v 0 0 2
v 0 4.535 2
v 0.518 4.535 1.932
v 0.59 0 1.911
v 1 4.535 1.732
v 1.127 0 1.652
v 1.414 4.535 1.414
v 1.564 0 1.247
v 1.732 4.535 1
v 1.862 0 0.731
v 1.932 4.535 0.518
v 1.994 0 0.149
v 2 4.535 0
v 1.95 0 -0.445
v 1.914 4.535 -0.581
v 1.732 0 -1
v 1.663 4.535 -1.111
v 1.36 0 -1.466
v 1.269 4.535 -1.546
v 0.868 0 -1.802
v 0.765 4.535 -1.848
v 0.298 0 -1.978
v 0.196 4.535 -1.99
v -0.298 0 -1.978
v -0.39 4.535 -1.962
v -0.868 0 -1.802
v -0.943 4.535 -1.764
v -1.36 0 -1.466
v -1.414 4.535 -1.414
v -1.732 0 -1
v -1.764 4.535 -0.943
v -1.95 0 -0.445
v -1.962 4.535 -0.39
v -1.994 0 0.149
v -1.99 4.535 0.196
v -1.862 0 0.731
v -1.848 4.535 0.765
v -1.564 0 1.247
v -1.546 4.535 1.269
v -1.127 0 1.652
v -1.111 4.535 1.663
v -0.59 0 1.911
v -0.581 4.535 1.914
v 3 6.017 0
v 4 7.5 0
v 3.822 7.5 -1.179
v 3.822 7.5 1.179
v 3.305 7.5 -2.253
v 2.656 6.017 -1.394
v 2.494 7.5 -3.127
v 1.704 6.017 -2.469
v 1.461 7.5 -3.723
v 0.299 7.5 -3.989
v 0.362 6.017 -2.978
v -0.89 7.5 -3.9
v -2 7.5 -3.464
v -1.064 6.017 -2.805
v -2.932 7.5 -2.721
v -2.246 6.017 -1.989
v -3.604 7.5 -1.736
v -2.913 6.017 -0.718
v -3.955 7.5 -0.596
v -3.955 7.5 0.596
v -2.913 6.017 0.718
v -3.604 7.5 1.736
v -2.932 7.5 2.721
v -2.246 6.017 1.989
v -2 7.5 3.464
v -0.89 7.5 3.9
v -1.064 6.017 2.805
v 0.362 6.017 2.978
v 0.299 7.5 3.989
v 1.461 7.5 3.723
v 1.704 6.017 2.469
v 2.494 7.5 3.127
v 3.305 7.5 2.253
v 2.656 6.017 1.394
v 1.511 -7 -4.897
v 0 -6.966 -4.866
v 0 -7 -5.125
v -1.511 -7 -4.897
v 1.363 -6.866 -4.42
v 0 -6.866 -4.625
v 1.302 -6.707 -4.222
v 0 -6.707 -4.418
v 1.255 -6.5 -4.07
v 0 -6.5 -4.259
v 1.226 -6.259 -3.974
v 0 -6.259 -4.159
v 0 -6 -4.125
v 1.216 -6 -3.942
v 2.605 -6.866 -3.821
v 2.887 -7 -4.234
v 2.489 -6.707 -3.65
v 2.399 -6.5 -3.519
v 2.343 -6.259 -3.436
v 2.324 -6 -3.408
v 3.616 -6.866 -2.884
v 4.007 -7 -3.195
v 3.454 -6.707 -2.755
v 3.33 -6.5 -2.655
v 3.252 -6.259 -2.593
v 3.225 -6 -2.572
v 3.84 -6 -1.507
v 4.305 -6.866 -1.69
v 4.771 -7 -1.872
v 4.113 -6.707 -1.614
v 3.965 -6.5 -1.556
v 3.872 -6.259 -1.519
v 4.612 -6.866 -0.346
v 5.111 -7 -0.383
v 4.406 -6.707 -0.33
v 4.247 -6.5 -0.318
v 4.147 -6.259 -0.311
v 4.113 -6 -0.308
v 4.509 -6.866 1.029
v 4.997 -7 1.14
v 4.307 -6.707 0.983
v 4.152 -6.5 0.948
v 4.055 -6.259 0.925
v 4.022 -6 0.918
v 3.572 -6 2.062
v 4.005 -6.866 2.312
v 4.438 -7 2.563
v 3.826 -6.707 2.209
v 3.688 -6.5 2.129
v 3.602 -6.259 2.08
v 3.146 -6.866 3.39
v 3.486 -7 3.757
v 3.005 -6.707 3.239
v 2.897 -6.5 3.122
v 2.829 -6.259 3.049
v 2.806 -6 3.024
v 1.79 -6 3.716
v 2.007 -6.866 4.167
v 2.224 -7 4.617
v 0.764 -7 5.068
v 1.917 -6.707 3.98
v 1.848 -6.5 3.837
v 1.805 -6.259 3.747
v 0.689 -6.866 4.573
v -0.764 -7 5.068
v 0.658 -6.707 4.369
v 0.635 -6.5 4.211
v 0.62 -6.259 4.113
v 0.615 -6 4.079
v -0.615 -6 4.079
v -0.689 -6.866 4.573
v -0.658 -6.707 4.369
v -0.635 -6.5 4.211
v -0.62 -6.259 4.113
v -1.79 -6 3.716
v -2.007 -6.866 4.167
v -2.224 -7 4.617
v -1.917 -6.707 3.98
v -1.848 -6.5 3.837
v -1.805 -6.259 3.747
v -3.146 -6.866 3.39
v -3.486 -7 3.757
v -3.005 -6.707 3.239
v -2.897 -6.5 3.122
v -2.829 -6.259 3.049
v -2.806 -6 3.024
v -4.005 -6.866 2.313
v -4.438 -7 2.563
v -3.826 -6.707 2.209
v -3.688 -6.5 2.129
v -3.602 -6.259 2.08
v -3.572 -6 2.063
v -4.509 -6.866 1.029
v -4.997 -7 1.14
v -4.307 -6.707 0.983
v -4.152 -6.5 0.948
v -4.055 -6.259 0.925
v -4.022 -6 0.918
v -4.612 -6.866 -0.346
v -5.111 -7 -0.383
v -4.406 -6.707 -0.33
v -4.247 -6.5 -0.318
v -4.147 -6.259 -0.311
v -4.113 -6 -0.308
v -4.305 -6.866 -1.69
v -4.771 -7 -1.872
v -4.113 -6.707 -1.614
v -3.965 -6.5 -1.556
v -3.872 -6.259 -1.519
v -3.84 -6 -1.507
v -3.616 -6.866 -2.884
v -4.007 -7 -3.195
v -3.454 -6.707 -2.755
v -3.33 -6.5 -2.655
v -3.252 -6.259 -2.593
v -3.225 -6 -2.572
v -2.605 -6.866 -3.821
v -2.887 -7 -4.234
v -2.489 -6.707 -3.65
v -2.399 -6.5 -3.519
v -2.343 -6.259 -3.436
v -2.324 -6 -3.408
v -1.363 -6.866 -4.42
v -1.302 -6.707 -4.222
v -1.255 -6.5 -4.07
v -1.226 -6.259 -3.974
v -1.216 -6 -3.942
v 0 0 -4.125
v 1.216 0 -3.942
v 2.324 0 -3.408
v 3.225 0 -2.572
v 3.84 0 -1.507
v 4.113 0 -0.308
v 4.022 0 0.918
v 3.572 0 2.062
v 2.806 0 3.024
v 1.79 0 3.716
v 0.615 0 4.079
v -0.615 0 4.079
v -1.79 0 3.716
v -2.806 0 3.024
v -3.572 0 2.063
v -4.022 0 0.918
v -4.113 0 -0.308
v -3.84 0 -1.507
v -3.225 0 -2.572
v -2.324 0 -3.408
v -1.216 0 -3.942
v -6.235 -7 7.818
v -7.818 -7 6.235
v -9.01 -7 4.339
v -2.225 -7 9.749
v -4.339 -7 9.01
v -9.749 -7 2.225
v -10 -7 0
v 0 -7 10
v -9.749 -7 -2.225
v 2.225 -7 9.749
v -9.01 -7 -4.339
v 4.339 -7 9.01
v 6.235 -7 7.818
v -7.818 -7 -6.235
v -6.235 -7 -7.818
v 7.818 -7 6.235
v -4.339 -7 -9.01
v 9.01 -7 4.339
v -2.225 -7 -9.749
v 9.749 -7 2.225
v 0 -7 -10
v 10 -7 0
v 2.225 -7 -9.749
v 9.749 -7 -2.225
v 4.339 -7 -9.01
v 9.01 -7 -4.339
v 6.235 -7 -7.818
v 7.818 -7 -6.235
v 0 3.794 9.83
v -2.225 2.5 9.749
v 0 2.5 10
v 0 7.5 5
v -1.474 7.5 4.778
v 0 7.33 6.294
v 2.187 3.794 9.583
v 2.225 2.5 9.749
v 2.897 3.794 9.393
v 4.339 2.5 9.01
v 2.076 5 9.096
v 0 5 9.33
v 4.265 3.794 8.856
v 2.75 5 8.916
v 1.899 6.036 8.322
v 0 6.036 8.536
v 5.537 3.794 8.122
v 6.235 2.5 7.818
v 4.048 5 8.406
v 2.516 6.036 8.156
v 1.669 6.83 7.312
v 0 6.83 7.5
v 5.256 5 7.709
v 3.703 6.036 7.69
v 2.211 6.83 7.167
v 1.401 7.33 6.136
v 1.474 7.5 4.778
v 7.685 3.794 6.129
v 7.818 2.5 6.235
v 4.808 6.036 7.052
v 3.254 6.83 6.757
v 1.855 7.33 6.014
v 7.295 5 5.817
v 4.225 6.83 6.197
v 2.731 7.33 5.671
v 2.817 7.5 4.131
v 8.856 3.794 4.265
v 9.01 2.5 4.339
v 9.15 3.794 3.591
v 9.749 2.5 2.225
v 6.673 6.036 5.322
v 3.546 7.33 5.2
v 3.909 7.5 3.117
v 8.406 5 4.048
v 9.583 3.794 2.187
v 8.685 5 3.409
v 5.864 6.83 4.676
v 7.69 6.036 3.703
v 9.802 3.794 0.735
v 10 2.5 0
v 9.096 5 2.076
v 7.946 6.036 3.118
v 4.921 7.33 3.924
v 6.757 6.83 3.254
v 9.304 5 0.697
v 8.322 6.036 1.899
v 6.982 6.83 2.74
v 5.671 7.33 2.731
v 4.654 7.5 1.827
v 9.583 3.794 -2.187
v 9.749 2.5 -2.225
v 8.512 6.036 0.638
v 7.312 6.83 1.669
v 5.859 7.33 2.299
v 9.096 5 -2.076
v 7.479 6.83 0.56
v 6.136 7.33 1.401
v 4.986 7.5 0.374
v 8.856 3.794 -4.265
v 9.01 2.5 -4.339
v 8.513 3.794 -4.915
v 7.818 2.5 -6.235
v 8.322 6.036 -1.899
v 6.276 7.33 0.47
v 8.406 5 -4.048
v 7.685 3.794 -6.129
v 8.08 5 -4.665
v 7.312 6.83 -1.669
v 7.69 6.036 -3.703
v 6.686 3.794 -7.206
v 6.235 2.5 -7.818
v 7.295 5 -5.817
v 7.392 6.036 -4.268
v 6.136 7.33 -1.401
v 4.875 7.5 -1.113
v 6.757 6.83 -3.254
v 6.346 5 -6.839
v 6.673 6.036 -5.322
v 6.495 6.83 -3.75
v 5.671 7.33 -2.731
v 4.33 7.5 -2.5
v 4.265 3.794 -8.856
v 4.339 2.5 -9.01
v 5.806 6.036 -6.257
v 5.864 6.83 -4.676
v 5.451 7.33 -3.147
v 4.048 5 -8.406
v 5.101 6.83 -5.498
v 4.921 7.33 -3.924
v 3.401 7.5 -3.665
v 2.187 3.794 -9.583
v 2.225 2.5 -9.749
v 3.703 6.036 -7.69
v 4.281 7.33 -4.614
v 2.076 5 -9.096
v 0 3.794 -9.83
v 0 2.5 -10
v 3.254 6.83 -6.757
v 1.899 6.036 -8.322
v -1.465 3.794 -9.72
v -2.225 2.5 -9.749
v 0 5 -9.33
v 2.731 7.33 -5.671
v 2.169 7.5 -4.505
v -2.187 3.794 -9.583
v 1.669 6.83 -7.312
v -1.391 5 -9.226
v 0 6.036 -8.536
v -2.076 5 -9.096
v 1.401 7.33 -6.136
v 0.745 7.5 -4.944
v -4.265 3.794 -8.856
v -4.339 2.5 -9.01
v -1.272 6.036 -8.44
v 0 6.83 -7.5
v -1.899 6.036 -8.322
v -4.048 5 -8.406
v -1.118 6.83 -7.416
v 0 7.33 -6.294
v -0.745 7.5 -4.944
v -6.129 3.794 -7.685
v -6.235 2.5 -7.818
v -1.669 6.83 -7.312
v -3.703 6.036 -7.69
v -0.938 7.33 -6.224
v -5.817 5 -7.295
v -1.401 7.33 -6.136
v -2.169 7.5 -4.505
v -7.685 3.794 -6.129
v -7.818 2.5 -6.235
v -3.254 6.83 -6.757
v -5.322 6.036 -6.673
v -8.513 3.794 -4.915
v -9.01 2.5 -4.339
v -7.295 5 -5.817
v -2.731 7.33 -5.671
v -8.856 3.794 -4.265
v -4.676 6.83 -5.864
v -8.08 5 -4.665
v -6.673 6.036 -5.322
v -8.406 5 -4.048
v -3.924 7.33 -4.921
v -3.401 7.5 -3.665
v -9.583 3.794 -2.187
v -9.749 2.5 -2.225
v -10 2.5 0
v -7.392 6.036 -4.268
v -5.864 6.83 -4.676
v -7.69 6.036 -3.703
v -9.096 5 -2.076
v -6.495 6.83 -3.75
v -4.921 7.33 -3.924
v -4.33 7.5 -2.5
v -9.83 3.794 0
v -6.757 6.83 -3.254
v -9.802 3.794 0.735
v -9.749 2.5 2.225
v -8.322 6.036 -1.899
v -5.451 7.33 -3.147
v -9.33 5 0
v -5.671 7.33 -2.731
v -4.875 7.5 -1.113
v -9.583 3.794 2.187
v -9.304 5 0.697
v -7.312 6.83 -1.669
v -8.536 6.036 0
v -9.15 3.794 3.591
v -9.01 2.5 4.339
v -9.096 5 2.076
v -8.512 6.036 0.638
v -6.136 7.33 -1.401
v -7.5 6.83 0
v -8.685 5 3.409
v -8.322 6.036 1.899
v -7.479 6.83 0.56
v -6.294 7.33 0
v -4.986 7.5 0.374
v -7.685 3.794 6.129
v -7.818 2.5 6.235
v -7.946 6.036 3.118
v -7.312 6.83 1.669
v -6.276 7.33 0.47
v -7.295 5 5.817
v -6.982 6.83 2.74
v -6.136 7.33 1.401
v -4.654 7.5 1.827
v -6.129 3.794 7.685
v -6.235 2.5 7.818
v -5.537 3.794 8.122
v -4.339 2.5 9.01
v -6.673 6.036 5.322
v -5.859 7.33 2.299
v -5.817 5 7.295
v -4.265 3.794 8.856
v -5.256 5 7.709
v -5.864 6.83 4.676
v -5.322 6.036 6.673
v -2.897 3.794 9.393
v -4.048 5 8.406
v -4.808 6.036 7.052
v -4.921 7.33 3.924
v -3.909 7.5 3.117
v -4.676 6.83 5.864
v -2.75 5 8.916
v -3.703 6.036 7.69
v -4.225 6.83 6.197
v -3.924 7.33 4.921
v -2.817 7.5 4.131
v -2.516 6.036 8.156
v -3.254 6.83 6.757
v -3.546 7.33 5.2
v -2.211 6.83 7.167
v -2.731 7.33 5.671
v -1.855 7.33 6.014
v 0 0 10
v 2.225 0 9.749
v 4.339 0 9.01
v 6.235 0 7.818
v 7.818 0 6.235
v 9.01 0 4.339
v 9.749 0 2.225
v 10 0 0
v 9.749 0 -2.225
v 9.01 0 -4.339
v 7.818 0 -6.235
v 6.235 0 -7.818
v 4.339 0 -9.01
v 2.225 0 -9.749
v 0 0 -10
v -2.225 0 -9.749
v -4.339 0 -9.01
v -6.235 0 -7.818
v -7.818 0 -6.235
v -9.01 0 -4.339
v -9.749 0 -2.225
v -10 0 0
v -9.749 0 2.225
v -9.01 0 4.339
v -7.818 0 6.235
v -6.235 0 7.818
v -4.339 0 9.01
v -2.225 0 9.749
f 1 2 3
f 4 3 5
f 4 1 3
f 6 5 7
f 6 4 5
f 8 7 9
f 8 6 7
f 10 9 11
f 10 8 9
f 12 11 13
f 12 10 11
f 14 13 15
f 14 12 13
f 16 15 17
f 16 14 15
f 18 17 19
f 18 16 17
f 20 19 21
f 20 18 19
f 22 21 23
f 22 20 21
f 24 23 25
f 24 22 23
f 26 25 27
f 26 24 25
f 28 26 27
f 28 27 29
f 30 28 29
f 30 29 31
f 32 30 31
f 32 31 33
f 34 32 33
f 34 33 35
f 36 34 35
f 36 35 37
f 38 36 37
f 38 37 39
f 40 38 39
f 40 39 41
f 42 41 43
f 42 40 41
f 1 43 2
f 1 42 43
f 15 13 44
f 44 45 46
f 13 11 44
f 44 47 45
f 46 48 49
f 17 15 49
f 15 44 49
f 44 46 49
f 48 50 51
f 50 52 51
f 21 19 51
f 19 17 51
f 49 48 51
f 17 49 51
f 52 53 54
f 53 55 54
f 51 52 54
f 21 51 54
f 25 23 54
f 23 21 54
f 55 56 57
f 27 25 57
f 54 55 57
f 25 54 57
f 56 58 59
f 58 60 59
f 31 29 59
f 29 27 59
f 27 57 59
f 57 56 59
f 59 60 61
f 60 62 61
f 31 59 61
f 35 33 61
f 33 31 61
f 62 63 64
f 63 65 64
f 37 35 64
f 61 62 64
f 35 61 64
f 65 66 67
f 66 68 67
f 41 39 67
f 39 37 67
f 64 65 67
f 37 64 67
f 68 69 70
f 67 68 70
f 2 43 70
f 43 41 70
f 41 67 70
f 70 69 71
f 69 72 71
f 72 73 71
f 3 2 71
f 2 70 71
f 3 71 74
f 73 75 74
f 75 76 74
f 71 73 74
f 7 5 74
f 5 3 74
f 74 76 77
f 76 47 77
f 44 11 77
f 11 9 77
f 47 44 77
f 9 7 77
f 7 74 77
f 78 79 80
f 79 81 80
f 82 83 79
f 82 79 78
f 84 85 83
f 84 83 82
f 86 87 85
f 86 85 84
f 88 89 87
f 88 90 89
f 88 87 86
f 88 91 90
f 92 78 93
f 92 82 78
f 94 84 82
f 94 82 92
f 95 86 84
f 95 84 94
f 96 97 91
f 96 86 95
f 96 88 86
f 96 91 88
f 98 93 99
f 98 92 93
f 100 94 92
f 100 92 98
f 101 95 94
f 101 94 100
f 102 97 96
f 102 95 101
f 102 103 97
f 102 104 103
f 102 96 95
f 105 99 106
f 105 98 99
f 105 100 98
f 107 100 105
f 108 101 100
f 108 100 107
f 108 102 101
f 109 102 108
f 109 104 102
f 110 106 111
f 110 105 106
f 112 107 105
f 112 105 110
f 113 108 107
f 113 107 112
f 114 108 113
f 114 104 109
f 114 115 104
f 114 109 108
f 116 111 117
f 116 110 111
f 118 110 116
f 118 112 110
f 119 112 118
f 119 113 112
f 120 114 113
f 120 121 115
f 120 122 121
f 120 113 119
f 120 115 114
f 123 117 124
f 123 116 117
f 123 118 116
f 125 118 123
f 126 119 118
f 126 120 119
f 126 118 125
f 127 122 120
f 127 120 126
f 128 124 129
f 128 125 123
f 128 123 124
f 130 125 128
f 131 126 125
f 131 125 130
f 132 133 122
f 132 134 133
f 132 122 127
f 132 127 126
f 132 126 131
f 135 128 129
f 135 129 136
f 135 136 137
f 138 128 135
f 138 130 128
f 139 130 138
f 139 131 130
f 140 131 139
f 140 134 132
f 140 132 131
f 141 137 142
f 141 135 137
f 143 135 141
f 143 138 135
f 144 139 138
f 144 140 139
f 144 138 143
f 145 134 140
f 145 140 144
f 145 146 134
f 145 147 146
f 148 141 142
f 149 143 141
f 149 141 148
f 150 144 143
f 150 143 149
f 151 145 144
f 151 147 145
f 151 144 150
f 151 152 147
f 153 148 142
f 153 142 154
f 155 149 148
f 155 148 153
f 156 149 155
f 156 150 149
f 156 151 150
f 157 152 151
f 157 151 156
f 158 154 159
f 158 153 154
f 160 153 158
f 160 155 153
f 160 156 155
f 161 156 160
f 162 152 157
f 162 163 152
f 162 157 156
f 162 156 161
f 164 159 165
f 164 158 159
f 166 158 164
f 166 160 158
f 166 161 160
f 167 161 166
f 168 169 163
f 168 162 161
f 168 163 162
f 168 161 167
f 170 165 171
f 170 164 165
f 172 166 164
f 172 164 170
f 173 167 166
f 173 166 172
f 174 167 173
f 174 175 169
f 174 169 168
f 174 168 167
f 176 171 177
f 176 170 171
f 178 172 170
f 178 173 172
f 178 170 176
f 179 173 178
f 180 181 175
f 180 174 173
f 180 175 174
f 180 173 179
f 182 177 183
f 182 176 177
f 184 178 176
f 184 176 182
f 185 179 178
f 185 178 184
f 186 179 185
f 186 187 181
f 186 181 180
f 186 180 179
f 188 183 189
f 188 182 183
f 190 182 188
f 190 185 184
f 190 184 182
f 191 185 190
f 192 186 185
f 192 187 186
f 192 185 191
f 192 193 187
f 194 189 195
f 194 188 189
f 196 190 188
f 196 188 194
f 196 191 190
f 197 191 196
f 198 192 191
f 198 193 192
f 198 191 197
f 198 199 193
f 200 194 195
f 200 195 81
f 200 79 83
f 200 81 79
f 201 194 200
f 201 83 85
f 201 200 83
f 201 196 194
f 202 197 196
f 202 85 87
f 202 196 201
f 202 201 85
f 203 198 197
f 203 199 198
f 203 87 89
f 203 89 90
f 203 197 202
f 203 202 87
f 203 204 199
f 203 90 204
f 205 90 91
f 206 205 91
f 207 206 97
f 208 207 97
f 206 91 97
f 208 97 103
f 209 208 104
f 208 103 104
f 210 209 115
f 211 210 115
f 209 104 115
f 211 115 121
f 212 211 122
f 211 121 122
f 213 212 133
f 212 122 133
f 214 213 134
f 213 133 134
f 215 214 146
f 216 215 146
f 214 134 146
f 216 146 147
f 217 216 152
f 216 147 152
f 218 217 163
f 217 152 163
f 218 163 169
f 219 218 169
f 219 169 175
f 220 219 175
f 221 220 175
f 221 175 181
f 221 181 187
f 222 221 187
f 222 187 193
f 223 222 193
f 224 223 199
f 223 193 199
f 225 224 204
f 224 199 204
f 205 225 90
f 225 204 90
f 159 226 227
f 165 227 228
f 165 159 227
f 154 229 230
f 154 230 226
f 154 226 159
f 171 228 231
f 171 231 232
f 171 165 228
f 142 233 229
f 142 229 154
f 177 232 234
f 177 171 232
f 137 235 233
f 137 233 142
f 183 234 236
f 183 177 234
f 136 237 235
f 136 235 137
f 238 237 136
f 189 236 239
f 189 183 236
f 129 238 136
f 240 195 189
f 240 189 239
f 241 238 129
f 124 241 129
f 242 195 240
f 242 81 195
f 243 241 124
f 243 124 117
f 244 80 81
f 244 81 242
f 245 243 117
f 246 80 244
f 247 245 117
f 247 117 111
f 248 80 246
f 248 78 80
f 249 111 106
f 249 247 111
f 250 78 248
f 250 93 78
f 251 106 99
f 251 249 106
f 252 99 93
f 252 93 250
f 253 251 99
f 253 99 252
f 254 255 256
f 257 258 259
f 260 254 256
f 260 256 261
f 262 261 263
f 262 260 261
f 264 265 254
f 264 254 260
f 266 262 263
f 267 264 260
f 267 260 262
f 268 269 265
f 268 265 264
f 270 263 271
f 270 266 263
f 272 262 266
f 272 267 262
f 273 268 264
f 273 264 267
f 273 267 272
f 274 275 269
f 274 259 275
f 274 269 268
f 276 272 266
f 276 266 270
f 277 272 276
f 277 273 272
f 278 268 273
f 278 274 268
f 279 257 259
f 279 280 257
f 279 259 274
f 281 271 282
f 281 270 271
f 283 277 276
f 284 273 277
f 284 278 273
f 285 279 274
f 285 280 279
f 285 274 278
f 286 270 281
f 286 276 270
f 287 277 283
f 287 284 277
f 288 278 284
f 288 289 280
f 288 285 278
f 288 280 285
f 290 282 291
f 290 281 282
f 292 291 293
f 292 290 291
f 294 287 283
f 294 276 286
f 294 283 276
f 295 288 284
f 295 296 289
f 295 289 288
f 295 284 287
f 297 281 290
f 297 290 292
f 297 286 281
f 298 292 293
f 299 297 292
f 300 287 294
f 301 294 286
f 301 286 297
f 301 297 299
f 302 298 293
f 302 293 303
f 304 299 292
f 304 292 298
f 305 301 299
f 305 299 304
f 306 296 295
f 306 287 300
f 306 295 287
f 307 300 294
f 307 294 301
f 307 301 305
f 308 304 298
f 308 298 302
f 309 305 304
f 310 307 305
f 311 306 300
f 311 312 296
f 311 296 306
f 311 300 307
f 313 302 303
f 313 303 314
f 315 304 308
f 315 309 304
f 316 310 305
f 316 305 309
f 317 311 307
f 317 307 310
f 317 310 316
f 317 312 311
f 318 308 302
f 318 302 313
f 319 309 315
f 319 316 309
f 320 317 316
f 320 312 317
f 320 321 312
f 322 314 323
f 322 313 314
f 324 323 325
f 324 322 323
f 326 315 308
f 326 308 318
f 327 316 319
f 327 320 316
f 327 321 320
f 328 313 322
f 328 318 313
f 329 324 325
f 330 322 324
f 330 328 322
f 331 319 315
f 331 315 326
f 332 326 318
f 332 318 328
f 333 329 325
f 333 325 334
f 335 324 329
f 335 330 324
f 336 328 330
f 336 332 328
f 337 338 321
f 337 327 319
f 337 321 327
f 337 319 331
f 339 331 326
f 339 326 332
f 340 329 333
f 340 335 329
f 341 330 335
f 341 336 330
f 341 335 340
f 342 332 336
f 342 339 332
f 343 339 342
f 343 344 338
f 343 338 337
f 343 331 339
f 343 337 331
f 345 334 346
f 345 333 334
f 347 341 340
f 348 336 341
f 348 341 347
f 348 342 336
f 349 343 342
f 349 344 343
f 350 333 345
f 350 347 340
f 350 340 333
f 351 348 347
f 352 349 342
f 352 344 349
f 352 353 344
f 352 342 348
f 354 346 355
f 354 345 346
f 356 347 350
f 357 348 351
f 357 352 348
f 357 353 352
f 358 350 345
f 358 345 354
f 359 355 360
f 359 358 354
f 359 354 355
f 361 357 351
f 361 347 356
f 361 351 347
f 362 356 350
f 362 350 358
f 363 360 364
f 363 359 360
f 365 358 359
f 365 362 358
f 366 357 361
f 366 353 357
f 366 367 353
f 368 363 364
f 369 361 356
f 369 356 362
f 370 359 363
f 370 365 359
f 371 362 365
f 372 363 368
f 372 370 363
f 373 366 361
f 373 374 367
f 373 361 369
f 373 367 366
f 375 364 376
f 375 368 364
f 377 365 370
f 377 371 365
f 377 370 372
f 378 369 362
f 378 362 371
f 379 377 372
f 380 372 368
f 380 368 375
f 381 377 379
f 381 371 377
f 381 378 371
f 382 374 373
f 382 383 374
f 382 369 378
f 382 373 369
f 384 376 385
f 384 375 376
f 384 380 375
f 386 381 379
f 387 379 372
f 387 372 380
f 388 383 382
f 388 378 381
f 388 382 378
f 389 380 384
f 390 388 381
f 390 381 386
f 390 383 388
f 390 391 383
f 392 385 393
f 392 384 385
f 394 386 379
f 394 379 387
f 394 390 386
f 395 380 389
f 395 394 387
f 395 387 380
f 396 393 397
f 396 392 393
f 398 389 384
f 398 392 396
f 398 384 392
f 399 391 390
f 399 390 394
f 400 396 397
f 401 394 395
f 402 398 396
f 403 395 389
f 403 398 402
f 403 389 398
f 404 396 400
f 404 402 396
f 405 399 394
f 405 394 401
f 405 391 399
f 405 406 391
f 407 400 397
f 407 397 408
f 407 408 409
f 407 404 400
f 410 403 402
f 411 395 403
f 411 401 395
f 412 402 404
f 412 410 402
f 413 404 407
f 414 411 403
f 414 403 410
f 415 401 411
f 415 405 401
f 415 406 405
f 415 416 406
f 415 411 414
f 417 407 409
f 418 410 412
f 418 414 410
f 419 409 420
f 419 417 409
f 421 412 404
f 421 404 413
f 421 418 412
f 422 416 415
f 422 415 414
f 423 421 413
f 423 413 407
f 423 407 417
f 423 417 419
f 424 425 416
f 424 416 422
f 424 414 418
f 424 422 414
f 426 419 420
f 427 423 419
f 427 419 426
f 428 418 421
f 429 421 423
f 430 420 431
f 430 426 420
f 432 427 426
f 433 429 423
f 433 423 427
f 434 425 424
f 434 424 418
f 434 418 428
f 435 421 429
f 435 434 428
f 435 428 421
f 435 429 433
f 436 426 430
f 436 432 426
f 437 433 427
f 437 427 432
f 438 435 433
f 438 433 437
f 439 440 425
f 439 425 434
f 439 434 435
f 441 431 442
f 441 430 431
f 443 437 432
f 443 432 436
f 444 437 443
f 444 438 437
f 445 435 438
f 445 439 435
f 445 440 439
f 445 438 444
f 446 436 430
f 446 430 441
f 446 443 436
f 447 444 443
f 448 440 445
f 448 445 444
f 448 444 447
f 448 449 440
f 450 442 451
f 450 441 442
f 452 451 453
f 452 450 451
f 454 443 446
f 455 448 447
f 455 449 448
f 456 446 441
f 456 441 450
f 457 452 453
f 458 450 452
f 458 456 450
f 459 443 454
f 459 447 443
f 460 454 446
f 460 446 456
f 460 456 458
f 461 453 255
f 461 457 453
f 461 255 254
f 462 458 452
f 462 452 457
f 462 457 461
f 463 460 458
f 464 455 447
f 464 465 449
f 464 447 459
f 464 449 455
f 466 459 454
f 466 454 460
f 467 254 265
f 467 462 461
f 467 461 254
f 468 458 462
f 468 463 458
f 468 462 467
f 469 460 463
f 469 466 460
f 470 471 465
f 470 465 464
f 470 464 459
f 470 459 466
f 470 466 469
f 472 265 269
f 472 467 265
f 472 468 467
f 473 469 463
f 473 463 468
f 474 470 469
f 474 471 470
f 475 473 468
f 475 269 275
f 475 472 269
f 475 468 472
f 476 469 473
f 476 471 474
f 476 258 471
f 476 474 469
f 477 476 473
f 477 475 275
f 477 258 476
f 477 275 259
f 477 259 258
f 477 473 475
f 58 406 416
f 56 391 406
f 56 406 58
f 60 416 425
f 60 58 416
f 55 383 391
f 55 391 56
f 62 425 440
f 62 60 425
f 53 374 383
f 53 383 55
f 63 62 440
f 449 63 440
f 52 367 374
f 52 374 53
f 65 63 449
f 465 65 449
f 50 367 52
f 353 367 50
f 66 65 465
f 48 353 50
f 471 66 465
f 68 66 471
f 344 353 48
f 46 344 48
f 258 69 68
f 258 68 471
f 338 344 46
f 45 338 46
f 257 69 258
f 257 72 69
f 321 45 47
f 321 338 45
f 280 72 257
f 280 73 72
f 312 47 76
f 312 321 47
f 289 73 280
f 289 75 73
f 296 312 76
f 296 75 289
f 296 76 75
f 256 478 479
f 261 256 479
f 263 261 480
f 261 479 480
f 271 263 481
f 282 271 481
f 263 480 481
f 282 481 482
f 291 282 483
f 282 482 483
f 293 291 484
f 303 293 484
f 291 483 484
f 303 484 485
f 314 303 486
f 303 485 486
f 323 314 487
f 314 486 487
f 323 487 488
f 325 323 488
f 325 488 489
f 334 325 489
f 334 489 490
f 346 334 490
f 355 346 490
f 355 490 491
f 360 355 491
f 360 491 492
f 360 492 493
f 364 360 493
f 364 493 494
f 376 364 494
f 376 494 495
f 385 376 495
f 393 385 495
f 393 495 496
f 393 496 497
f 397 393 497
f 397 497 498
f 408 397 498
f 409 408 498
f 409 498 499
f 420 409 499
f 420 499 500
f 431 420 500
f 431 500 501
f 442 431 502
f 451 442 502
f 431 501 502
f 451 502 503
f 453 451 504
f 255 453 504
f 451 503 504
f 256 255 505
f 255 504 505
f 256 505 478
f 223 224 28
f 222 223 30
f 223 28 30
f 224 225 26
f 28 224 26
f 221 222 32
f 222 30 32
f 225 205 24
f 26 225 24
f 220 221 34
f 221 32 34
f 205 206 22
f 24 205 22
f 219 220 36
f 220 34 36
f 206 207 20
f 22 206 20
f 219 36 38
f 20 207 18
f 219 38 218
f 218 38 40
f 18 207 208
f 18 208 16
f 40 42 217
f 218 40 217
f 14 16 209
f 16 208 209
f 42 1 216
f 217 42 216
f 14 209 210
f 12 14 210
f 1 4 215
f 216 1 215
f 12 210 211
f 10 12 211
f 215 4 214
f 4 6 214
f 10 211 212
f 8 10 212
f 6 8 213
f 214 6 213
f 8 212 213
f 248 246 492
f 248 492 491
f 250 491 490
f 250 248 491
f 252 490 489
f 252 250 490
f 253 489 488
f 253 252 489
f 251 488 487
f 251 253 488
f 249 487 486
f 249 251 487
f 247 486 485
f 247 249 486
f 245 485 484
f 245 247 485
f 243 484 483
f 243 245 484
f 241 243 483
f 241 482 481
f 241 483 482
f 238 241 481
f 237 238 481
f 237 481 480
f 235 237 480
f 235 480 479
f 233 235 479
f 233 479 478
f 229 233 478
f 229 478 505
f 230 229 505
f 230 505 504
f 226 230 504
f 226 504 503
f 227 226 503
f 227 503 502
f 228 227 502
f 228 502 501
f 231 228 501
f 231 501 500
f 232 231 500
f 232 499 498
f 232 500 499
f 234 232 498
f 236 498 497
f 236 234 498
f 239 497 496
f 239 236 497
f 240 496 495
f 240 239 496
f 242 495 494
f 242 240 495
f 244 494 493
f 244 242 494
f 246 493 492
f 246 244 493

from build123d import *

# Parameters (mm, degrees)
SKETCH1_R           = 10
SKETCH1_R_2         = 2
BOSS_EXTRUDE1_DEPTH = 7.5
BOSS_EXTRUDE2_START = 7
SKETCH2_R           = 10
SKETCH2_R_2         = 4.125
BOSS_EXTRUDE2_DEPTH = 7
SKETCH3_R           = 4
CUT_EXTRUDE1_DEPTH  = 3
CUT_EXTRUDE1_DRAFT  = -34
FILLET1_R           = 5
FILLET2_R           = 1


with BuildPart() as part:
    # Sketch1 → Boss-Extrude1 (new body)
    with BuildSketch(Plane(origin=(0, 0, 0), x_dir=(1, 0, 0), z_dir=(0, 1, 0))):
        with Locations(Location((0, 0, 0), (0, 0, 270))):
            Circle(SKETCH1_R)
        with Locations(Location((0, 0, 0), (0, 0, 270))):
            Circle(SKETCH1_R_2, mode=Mode.SUBTRACT)
    extrude(amount=BOSS_EXTRUDE1_DEPTH)

    # Sketch2 → Boss-Extrude2 (add)
    with BuildSketch(Plane.XZ.offset(BOSS_EXTRUDE2_START)):
        with Locations(Location((0, 0, 0), (0, 0, 270))):
            Circle(SKETCH2_R)
        with Locations(Location((0, 0, 0), (0, 0, 270))):
            Circle(SKETCH2_R_2, mode=Mode.SUBTRACT)
    extrude(amount=-BOSS_EXTRUDE2_DEPTH)


with BuildPart() as cut_extrude1_tool:
    # Sketch3 → Cut-Extrude1 (with draft: the straight prism first)
    with BuildSketch(Plane(origin=(0, 7.5, 0), x_dir=(1, 0, 0), z_dir=(0, 1, 0))):
        Circle(SKETCH3_R)
    extrude(amount=-CUT_EXTRUDE1_DEPTH)
    # Cut-Extrude1: the draft: its side faces are tilted about the plane it starts from
    cut_extrude1_sides = [cut_extrude1_tool.faces().sort_by_distance(p)[0] for p in [
        (-4, 6, 0),
    ]]
    draft(cut_extrude1_sides, Plane(origin=(0, 7.5, 0), x_dir=(1, 0, 0), z_dir=(0, 1, 0)), CUT_EXTRUDE1_DRAFT)


with BuildPart() as part_1:
    add(part.part)

    # Cut-Extrude1: cut by cut_extrude1_tool
    add(cut_extrude1_tool.part, mode=Mode.SUBTRACT)

    # Fillet1
    fillet1_edges = [part_1.edges().sort_by_distance(p)[0] for p in [
        (0, 7.5, -10),
    ]]
    fillet(fillet1_edges, radius=FILLET1_R)

    # Fillet2
    fillet2_edges = [part_1.edges().sort_by_distance(p)[0] for p in [
        (0, -7, 4.125),
    ]]
    fillet(fillet2_edges, radius=FILLET2_R)


solid = part_1.part
